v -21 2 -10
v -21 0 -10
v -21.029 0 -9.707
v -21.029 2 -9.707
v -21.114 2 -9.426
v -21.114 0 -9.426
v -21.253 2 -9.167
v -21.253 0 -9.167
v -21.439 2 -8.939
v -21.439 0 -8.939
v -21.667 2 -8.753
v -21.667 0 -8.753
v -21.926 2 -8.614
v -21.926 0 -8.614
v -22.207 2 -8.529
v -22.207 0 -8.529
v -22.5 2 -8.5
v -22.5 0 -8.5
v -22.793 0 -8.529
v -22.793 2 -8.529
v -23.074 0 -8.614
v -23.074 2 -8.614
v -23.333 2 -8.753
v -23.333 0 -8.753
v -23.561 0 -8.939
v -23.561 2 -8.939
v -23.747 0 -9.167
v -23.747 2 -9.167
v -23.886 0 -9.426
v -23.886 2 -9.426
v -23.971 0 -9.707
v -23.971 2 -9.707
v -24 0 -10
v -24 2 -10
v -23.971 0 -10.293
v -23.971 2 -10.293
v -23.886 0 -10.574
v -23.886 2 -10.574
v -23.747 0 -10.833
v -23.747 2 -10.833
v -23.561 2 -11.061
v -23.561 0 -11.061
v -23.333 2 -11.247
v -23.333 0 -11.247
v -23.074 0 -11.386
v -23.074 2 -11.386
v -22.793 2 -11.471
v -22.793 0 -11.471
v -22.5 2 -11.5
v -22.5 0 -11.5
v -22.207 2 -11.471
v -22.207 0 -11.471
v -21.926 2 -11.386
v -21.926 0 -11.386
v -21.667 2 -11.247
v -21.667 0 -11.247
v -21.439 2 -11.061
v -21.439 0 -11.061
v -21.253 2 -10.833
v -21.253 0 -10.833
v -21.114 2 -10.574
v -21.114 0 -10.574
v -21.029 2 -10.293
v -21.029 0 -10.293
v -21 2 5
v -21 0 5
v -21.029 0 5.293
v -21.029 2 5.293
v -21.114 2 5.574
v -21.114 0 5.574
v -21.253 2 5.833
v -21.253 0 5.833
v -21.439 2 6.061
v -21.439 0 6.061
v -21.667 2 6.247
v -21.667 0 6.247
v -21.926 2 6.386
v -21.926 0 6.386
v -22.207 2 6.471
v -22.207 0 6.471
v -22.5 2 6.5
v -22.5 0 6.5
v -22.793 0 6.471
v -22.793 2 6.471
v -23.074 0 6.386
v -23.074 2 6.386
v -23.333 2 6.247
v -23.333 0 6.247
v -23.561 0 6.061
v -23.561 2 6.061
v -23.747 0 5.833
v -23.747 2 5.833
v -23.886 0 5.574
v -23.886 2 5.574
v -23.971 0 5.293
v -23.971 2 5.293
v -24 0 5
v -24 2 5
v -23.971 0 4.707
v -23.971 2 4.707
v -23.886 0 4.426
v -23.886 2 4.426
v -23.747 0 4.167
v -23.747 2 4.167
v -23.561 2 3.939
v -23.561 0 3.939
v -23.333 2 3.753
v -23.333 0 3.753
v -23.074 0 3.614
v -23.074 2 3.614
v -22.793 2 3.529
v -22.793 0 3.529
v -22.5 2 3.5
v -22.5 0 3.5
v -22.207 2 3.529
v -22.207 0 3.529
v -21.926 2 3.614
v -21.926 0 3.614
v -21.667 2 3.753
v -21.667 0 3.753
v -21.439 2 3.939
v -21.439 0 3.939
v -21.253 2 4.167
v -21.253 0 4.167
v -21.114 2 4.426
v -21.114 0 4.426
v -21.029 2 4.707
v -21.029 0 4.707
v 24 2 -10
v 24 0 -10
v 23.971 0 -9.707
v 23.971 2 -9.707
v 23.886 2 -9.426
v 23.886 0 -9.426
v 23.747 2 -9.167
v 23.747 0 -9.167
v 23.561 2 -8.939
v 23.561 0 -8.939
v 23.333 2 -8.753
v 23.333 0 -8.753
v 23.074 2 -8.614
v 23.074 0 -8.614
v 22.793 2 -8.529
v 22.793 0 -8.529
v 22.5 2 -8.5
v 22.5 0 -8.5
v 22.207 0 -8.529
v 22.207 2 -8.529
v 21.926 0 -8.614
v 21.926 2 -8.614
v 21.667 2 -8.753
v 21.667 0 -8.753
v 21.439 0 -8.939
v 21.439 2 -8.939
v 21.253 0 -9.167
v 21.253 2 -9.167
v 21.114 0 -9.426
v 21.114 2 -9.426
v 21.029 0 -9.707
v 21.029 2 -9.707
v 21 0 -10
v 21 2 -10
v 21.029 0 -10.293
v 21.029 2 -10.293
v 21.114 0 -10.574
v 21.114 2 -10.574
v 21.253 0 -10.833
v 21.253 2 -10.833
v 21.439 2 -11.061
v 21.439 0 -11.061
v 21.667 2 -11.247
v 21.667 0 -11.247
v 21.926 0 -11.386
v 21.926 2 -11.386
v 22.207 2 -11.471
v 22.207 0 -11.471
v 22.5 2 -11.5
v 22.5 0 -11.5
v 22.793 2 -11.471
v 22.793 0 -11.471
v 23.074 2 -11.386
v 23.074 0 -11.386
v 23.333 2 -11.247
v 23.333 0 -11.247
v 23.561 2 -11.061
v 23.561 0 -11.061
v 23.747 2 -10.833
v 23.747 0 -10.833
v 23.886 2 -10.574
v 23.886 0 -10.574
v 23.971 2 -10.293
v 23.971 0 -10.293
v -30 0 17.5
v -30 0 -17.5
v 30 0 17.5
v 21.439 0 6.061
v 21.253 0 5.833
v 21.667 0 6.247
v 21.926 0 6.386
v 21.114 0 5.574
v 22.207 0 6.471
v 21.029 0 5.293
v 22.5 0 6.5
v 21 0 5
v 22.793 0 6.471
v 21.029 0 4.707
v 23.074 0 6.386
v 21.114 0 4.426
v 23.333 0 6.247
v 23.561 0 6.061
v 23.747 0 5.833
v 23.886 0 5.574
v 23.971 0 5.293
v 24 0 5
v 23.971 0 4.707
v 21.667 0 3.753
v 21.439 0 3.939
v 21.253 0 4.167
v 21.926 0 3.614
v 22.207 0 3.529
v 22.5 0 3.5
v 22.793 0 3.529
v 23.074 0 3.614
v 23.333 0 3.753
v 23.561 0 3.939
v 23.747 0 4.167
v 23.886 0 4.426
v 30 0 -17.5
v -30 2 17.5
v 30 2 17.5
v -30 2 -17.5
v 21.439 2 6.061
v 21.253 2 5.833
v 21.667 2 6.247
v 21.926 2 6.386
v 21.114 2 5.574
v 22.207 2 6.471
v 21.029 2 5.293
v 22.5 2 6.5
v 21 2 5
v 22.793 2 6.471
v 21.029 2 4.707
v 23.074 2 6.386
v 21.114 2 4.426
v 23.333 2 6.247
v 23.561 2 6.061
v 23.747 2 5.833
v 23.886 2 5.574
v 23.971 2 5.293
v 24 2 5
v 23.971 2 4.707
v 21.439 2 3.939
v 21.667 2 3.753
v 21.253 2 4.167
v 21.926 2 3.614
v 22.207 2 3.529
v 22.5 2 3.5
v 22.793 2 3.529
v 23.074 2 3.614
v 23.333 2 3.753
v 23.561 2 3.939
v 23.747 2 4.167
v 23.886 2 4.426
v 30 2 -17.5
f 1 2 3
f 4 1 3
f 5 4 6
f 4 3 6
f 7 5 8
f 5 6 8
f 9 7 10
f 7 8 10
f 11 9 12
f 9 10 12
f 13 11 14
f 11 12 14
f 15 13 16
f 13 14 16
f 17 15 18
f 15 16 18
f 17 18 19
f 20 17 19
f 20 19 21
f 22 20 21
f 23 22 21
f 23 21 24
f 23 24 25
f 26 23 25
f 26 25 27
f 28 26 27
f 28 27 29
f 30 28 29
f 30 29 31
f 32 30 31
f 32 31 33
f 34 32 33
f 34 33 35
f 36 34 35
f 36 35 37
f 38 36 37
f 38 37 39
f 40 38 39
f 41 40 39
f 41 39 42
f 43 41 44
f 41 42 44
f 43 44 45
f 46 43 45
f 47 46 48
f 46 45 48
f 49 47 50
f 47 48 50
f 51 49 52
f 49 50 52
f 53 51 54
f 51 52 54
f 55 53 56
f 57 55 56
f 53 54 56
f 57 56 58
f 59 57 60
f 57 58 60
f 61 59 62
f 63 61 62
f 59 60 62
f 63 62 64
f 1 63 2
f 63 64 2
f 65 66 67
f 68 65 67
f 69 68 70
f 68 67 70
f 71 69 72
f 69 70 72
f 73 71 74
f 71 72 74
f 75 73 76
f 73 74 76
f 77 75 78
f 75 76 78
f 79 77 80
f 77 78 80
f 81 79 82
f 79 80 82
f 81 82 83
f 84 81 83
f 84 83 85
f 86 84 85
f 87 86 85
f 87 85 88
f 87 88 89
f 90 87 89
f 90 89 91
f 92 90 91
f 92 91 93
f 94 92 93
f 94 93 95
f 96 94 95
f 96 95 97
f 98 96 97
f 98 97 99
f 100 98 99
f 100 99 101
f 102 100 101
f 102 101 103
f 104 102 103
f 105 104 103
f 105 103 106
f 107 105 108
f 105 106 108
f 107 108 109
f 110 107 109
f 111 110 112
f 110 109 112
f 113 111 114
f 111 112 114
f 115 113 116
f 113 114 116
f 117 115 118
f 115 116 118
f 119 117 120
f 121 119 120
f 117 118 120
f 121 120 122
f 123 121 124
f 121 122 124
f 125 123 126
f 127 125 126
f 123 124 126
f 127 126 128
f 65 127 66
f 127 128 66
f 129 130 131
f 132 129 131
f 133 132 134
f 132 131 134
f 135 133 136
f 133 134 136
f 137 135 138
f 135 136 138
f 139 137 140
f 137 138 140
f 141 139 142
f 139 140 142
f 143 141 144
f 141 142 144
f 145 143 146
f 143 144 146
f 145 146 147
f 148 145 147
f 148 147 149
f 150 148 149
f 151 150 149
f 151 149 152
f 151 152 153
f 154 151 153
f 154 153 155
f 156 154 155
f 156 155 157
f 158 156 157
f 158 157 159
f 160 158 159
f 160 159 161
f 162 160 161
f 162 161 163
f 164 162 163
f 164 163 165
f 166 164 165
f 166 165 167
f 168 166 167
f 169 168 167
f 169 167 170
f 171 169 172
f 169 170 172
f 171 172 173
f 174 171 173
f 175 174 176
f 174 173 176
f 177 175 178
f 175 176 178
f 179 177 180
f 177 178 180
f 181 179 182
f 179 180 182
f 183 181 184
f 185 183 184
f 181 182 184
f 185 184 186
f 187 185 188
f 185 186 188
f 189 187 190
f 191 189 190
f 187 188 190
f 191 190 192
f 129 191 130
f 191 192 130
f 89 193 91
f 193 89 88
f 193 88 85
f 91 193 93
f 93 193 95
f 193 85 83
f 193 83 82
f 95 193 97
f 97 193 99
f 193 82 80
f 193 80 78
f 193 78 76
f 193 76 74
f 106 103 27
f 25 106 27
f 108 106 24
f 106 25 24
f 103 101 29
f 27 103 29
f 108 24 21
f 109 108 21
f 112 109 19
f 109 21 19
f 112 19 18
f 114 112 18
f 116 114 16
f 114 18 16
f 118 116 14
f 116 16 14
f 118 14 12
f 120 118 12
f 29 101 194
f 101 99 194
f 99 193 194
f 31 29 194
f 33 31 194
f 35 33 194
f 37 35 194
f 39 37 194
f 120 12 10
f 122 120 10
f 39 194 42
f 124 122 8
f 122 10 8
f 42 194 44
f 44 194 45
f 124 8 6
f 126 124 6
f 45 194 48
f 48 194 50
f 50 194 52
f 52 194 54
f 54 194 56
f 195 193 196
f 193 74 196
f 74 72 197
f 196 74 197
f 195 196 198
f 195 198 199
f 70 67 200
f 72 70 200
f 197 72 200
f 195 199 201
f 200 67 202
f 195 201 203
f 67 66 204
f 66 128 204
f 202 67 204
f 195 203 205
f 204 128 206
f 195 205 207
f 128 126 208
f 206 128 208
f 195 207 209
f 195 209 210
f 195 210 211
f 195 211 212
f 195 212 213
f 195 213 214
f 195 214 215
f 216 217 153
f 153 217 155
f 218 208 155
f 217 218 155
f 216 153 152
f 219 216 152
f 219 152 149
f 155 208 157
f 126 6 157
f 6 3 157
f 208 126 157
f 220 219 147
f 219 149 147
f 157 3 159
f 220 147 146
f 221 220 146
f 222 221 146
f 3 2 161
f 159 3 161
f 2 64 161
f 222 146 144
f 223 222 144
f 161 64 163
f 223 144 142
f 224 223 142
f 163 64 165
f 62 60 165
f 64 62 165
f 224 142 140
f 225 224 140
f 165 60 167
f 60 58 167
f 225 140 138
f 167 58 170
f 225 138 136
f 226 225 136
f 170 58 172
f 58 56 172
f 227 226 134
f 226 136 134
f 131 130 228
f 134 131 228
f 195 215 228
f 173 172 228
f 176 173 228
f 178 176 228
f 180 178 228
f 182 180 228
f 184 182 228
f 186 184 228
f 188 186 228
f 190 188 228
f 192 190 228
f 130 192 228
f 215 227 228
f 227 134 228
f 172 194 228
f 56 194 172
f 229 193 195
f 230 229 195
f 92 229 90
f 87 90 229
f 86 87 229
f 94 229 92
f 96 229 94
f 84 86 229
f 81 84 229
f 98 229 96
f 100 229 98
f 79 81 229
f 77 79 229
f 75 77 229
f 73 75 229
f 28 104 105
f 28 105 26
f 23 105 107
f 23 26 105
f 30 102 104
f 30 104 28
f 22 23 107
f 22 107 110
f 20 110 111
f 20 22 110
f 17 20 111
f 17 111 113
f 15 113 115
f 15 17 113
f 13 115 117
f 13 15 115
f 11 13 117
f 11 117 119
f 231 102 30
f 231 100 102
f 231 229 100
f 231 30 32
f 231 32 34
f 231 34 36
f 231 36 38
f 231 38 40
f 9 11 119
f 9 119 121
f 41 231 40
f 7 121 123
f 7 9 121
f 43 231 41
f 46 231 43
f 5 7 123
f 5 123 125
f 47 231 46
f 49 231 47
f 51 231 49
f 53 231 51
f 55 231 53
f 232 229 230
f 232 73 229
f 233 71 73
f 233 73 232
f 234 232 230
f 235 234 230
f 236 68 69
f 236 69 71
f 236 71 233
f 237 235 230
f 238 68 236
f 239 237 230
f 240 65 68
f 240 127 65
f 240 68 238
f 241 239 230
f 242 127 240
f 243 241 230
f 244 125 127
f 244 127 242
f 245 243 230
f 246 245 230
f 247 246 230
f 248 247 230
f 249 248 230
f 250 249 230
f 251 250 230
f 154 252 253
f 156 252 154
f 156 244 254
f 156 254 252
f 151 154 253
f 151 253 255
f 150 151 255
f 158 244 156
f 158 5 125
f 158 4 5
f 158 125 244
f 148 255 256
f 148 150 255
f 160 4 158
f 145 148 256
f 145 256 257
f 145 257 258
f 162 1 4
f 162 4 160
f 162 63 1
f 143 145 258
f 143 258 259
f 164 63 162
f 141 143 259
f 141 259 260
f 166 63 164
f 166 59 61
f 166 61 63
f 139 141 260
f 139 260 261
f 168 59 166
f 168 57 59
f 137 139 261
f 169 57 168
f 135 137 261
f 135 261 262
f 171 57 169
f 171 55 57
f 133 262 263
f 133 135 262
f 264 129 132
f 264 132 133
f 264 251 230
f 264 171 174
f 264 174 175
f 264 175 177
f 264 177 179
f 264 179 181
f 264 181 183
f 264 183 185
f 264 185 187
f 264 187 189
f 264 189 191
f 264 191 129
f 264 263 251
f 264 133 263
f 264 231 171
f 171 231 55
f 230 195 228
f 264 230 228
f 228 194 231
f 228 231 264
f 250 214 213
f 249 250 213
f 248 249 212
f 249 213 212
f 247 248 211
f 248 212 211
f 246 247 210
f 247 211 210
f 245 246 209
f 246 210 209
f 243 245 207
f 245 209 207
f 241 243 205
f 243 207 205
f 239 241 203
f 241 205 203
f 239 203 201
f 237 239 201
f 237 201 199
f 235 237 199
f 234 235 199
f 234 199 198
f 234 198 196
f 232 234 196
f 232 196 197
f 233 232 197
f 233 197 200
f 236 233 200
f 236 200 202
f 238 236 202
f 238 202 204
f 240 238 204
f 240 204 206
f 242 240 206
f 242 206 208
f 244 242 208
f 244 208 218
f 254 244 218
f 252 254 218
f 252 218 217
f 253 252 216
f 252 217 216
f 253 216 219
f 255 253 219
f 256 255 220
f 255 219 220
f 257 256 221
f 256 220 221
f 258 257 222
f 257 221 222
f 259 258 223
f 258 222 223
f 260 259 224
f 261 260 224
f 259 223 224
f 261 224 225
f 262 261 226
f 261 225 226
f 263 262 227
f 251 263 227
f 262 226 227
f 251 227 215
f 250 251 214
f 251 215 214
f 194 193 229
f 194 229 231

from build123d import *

# Parameters (mm, degrees)
CROQUIS1_W              = 60
CROQUIS1_H              = 35
SALIENTE_EXTRUIR1_DEPTH = 2
CORTAR_EXTRUIR1_REACH   = 4
CROQUIS2_R              = 1.5


with BuildPart() as part:
    # Croquis1 → Saliente-Extruir1 (new body)
    with BuildSketch(Plane(origin=(0, 0, 0), x_dir=(1, 0, 0), z_dir=(0, 1, 0))):
        Rectangle(CROQUIS1_W, CROQUIS1_H)
    extrude(amount=SALIENTE_EXTRUIR1_DEPTH)

    # Croquis2 → Cortar-Extruir1 (cut, up to next)
    with BuildSketch(Plane.XZ, mode=Mode.PRIVATE) as cortar_extruir1_sk1:
        with Locations((22.5, -10)):
            Circle(CROQUIS2_R)
    cortar_extruir1_tool1 = extrude(cortar_extruir1_sk1.sketch, amount=-CORTAR_EXTRUIR1_REACH, mode=Mode.PRIVATE) & part.part
    add(cortar_extruir1_tool1.solids().sort_by_distance((22.5, 0, -10))[0], mode=Mode.SUBTRACT)
    # Croquis2 → Cortar-Extruir1 (cut, up to next)
    with BuildSketch(Plane.XZ, mode=Mode.PRIVATE) as cortar_extruir1_sk2:
        with Locations((22.5, 5)):
            Circle(CROQUIS2_R)
    cortar_extruir1_tool2 = extrude(cortar_extruir1_sk2.sketch, amount=-CORTAR_EXTRUIR1_REACH, mode=Mode.PRIVATE) & part.part
    add(cortar_extruir1_tool2.solids().sort_by_distance((22.5, 0, 5))[0], mode=Mode.SUBTRACT)
    # Croquis2 → Cortar-Extruir1 (cut, up to next)
    with BuildSketch(Plane.XZ, mode=Mode.PRIVATE) as cortar_extruir1_sk3:
        with Locations((-22.5, -10)):
            Circle(CROQUIS2_R)
    cortar_extruir1_tool3 = extrude(cortar_extruir1_sk3.sketch, amount=-CORTAR_EXTRUIR1_REACH, mode=Mode.PRIVATE) & part.part
    add(cortar_extruir1_tool3.solids().sort_by_distance((-22.5, 0, -10))[0], mode=Mode.SUBTRACT)
    # Croquis2 → Cortar-Extruir1 (cut, up to next)
    with BuildSketch(Plane.XZ, mode=Mode.PRIVATE) as cortar_extruir1_sk4:
        with Locations((-22.5, 5)):
            Circle(CROQUIS2_R)
    cortar_extruir1_tool4 = extrude(cortar_extruir1_sk4.sketch, amount=-CORTAR_EXTRUIR1_REACH, mode=Mode.PRIVATE) & part.part
    add(cortar_extruir1_tool4.solids().sort_by_distance((-22.5, 0, 5))[0], mode=Mode.SUBTRACT)


solid = part.part
